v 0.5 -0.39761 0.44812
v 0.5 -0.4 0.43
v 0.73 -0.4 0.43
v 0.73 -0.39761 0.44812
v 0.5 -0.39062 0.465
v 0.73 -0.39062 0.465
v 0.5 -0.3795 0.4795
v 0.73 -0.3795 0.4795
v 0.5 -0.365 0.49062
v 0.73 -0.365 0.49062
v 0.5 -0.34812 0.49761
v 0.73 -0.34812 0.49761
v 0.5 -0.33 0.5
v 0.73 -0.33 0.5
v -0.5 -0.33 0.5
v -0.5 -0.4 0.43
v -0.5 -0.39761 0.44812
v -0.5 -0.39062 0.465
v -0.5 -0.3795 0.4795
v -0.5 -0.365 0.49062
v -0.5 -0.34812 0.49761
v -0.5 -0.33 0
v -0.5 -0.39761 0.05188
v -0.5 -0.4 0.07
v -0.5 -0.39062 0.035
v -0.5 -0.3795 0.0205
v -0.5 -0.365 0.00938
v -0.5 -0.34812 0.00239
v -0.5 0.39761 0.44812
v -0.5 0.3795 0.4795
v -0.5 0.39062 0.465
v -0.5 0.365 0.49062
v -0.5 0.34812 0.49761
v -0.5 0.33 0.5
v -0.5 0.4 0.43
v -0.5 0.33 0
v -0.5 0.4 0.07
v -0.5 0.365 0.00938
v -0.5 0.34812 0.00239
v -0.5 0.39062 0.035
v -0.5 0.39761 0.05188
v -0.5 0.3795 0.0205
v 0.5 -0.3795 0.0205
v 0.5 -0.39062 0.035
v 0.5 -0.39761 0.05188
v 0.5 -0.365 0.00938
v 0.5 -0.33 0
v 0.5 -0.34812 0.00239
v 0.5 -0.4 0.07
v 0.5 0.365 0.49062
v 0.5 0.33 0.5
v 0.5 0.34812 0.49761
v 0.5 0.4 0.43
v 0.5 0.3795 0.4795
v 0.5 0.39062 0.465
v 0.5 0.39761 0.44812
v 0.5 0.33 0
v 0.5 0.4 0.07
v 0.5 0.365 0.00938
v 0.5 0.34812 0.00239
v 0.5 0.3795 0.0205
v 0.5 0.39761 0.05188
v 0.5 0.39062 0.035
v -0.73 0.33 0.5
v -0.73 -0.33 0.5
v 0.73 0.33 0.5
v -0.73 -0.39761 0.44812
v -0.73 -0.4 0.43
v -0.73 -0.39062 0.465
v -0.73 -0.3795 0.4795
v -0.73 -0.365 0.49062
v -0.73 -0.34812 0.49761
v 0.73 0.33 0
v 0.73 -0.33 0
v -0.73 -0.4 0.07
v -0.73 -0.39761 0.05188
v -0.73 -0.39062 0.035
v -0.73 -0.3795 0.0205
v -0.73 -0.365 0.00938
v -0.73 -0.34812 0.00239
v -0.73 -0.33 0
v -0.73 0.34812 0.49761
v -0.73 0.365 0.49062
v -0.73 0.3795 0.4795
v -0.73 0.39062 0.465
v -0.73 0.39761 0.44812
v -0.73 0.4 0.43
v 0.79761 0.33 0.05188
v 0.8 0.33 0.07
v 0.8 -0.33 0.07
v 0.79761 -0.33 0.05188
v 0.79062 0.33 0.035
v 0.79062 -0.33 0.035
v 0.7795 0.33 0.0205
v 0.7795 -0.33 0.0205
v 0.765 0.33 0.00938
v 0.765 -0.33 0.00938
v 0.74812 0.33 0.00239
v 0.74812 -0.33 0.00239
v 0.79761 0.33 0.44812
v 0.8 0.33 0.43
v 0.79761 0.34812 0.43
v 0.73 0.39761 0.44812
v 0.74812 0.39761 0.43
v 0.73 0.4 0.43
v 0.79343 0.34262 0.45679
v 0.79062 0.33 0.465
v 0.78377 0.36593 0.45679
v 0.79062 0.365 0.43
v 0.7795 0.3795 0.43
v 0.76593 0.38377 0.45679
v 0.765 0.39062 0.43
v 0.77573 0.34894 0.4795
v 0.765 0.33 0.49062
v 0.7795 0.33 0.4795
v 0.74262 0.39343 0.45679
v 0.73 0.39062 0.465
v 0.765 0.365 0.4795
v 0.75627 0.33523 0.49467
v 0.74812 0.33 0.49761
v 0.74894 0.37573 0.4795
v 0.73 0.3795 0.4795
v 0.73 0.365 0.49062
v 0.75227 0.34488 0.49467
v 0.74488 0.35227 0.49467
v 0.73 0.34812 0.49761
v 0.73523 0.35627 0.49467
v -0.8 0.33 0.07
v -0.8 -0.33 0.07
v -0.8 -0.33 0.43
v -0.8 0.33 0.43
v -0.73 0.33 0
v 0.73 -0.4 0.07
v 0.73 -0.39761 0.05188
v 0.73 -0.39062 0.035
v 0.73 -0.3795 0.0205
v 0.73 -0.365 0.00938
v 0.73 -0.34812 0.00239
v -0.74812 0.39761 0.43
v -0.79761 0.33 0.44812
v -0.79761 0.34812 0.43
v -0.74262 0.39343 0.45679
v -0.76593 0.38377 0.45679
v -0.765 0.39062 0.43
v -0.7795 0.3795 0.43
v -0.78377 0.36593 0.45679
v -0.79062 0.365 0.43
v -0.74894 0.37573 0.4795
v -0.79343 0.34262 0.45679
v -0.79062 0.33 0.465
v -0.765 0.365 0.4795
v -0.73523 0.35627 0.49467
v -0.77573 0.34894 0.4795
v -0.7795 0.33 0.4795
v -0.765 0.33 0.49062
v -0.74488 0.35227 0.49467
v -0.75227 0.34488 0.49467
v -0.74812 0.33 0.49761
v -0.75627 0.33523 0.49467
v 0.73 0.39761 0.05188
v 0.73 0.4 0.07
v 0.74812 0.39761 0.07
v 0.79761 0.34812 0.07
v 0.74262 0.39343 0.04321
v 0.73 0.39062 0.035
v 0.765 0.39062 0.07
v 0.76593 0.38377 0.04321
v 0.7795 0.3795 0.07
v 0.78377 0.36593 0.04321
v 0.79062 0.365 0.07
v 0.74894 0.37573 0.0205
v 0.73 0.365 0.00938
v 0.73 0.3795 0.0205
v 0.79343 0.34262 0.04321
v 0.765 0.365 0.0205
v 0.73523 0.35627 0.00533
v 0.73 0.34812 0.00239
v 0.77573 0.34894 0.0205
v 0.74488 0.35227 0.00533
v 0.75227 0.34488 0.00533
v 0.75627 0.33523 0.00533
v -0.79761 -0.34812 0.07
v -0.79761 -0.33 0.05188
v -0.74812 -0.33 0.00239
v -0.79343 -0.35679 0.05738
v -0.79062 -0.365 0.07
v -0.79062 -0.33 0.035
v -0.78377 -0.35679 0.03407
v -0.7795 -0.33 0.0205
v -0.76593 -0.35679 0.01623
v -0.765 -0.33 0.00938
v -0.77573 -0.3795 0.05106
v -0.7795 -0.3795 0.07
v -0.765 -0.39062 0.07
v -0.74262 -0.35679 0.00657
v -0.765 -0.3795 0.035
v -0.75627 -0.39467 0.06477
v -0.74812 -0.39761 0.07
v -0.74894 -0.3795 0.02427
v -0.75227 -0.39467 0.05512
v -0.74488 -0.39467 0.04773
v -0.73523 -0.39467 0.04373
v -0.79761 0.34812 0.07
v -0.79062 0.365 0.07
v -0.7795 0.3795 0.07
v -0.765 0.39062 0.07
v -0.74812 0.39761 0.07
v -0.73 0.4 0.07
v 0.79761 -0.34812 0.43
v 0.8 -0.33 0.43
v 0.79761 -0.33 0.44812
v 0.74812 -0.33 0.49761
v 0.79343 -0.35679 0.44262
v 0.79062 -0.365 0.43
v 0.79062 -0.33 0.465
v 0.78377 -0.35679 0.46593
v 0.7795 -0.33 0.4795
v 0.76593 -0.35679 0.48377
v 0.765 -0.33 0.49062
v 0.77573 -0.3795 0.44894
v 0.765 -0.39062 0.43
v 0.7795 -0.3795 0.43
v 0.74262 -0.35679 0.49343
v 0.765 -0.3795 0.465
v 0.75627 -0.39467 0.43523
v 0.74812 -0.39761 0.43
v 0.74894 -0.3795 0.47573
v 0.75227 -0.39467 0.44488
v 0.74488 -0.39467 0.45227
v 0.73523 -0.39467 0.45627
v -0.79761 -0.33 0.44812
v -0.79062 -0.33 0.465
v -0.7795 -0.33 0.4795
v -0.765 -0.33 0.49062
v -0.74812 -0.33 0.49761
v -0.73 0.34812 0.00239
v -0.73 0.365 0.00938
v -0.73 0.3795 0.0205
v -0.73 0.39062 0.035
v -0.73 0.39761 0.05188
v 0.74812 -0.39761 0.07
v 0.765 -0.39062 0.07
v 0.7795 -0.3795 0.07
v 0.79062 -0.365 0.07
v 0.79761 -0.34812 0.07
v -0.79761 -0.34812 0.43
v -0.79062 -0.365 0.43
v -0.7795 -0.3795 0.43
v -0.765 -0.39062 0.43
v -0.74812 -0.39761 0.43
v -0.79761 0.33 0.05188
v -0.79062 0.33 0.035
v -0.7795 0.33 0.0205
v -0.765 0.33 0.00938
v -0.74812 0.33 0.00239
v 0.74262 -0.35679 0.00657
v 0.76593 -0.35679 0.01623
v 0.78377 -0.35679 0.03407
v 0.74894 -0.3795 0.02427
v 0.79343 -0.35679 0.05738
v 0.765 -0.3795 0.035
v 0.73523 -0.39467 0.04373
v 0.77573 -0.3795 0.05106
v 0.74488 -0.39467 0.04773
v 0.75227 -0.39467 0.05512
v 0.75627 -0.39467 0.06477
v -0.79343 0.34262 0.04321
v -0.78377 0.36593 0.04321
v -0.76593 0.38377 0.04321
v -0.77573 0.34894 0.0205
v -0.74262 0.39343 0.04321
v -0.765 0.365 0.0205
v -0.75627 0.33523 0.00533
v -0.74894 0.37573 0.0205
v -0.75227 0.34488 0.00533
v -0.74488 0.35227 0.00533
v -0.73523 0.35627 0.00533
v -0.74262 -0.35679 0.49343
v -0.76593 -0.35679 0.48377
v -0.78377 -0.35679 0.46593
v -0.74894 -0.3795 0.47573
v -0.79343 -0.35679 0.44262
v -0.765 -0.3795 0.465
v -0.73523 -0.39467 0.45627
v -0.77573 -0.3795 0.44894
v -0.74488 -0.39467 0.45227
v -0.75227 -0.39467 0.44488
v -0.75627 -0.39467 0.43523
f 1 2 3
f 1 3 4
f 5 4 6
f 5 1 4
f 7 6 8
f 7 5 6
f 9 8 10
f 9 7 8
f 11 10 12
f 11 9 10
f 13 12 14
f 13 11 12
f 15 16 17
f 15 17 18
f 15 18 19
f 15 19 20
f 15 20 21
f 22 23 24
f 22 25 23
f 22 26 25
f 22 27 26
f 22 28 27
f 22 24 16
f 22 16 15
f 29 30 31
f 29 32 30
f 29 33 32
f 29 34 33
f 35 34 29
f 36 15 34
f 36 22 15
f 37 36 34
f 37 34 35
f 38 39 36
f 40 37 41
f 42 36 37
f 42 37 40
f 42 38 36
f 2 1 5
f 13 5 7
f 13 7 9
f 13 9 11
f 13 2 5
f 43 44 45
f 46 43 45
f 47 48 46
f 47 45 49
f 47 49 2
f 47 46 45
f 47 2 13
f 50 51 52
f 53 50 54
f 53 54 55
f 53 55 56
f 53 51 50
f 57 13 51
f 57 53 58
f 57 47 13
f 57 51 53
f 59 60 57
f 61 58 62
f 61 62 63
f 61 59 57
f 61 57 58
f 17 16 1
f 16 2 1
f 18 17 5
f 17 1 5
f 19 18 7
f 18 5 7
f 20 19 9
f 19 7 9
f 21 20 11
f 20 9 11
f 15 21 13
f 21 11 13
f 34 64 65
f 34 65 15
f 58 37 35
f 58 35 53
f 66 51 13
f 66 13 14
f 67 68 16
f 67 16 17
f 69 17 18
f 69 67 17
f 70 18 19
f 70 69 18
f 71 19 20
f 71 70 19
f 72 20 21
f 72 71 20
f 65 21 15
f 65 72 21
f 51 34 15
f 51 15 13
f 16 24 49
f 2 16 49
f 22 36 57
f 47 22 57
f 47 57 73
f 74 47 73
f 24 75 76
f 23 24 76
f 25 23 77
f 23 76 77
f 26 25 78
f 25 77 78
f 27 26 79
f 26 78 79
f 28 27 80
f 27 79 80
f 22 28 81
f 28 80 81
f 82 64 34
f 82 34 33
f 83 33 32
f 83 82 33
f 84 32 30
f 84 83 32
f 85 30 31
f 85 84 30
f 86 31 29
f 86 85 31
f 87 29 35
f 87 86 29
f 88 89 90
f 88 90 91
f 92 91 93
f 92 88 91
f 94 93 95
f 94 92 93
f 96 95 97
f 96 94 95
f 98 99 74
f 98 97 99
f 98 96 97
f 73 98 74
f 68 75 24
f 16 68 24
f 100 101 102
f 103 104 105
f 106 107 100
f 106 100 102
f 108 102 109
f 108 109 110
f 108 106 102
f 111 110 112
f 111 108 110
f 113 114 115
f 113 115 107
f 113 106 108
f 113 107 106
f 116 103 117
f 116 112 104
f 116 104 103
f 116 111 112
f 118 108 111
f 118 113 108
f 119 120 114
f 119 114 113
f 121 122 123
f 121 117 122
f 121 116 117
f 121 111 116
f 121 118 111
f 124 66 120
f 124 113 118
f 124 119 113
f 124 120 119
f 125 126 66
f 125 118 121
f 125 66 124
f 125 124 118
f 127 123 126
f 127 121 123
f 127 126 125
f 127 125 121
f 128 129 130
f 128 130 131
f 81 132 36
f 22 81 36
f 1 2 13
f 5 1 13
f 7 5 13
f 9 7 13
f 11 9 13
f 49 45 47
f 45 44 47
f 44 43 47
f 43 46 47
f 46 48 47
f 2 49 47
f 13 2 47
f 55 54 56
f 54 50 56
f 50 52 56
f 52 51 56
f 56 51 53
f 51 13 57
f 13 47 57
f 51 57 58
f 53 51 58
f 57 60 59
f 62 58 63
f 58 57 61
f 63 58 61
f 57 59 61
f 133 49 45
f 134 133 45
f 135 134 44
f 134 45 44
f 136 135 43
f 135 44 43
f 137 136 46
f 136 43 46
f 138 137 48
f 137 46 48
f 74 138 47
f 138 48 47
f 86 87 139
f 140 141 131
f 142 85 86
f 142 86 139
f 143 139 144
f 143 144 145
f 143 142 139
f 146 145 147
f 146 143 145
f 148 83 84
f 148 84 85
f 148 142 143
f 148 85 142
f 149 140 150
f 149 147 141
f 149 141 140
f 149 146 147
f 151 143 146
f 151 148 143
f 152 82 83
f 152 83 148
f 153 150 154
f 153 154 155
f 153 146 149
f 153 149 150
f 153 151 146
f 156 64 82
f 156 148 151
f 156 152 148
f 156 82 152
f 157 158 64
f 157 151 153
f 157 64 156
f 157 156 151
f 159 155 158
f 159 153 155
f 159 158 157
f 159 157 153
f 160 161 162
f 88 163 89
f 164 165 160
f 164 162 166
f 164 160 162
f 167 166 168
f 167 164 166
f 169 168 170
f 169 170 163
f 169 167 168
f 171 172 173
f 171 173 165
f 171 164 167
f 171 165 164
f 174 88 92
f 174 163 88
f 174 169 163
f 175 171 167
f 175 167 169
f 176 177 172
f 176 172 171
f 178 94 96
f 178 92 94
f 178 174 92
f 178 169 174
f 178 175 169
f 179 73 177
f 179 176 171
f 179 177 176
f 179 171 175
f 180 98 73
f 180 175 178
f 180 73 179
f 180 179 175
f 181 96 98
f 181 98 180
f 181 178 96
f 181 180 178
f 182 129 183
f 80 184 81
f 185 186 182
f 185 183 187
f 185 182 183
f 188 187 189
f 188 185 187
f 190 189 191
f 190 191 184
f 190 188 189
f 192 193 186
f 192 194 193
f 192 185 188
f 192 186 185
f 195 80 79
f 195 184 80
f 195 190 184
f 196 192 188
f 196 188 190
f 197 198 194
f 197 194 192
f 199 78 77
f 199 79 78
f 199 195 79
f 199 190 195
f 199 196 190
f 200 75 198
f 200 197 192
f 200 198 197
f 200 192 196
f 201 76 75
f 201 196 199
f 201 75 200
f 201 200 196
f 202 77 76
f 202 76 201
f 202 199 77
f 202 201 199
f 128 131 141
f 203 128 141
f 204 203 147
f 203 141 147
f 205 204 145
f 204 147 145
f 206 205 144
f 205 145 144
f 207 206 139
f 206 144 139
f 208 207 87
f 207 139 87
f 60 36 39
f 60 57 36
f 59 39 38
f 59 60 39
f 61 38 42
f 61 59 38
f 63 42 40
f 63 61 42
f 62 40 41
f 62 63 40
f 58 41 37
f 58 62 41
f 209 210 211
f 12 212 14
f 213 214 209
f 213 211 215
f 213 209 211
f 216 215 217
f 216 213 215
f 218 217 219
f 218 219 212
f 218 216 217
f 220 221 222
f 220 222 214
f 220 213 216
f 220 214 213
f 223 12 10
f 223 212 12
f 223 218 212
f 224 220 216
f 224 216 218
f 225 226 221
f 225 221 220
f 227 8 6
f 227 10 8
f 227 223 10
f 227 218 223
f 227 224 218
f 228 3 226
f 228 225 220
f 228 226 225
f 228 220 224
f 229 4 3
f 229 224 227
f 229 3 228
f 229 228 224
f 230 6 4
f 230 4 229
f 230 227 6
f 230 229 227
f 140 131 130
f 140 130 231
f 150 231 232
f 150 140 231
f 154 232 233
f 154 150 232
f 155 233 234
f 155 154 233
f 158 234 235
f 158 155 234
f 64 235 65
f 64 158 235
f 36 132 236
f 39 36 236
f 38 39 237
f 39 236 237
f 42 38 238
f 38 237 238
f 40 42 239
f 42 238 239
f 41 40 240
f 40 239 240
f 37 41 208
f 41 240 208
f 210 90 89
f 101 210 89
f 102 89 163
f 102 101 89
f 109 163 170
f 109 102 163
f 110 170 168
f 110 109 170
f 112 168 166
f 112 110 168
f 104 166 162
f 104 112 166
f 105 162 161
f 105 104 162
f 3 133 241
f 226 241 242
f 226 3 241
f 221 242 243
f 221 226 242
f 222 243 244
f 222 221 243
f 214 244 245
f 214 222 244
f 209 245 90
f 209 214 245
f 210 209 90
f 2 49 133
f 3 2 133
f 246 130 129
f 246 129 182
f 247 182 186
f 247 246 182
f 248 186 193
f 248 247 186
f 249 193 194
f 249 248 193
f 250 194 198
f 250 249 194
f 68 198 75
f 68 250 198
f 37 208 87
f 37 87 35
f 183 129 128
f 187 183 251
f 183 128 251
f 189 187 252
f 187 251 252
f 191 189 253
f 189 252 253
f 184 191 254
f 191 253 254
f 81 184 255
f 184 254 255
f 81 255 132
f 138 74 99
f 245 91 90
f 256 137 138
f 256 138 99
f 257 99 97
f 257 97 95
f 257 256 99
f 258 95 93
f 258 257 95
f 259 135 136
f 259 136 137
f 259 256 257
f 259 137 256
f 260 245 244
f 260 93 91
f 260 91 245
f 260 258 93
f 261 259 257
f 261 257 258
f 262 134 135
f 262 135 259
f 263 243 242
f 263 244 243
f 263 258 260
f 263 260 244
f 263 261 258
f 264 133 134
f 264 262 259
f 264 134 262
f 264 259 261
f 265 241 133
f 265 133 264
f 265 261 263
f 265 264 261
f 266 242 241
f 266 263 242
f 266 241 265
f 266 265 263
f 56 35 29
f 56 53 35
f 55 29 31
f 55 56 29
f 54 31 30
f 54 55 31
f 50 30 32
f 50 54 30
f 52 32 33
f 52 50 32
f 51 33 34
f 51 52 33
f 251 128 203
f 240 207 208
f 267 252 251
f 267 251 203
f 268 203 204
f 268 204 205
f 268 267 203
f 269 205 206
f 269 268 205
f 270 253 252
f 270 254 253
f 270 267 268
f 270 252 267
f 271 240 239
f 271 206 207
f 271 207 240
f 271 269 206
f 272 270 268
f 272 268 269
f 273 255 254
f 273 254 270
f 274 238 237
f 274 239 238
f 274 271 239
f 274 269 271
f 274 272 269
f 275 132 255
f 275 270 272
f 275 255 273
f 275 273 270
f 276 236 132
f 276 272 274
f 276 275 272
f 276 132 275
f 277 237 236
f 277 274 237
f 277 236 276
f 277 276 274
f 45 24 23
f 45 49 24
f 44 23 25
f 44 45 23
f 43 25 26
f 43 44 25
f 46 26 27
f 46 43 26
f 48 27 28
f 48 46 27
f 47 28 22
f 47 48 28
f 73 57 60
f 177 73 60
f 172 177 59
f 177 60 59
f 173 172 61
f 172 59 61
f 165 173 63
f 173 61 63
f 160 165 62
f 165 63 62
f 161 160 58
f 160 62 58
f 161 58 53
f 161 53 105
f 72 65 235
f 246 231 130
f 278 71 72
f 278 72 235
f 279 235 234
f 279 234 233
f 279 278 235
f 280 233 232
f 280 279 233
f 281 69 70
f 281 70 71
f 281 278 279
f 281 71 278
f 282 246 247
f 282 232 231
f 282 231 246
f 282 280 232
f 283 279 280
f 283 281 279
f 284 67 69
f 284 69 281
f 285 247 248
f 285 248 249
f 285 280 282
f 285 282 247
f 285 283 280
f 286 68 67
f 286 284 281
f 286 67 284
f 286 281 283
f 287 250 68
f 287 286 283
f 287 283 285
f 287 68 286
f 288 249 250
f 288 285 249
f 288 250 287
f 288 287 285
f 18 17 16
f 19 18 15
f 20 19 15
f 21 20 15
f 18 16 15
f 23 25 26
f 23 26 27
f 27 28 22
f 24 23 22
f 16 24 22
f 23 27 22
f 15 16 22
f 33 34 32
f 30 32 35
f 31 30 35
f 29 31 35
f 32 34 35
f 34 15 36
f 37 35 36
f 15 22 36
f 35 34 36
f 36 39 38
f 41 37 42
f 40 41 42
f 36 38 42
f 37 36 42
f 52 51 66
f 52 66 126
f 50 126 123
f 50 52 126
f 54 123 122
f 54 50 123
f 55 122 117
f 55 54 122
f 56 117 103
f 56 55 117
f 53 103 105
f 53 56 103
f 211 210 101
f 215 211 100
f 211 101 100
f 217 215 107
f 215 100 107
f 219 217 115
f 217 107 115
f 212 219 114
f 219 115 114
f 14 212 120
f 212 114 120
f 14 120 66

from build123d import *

# Parameters (mm, degrees)
F0_W           = 0.3
F0_H           = 0.8
F1_DEPTH       = 0.5
F0_W_2         = 1
F2_DEPTH       = 0.5
F3_R           = 0.07
F3_2_R         = 0.07
F4_T1_DEPTH    = 0.405
F4_S5_W        = 0.07
F4_S5_H        = 0.07
F4_T6_DEPTH    = 0.07
F4_S11_W       = 0.07
F4_S11_H       = 0.07
F4_T12_DEPTH   = 0.07
F4_S17_W       = 0.07
F4_S17_H       = 0.07
F4_T18_DEPTH   = 0.07
F4_S23_W       = 0.07
F4_S23_H       = 0.07
F4_T24_DEPTH   = 0.07
F4_2_F1_R      = 0.07
F4_2_F2_R      = 0.07
F4_2_F3_R      = 0.07
F4_2_F4_R      = 0.07
F4_3_T1_DEPTH  = 0.405
F4_3_S5_W      = 0.07
F4_3_S5_H      = 0.07
F4_3_T6_DEPTH  = 0.07
F4_3_S11_W     = 0.07
F4_3_S11_H     = 0.07
F4_3_T12_DEPTH = 0.07
F4_3_S17_W     = 0.07
F4_3_S17_H     = 0.07
F4_3_T18_DEPTH = 0.07
F4_3_S23_W     = 0.07
F4_3_S23_H     = 0.07
F4_3_T24_DEPTH = 0.07


# Not quite as in the source:
# - a fillet or chamfer that OpenCascade refuses, or shapes differently, is made with other operations: its cross-section is extruded or revolved along the edge and cut away or added


with BuildPart() as f1:
    # F0 (on Top) → F1 (new body)
    with BuildSketch(Plane.XY):
        with Locations((-0.65, 0)):
            Rectangle(F0_W, F0_H)
    extrude(amount=F1_DEPTH)

    # F3#2
    f3_2_edges = [f1.edges().sort_by_distance(p)[0] for p in [
        (-0.8, 0.4, 0.25),
        (-0.8, -0.4, 0.25),
        (-0.8, 0, 0),
        (-0.8, 0, 0.5),
    ]]
    fillet(f3_2_edges, radius=F3_2_R)

    # F4#3: fillet of radius 0.07 on 4 edges, made by hand

    # F4_3_s2 → F4_3_t1 (cut)
    with BuildSketch(Plane.YZ.offset(-0.73)):
        with BuildLine():
            ThreePointArc((0.33, 0.5), (0.3794974747, 0.4794974747), (0.4, 0.43))
            Line((0.4, 0.43), (0.4, 0.5))
            Line((0.4, 0.5), (0.33, 0.5))
        make_face()
        with BuildLine():
            ThreePointArc((0.33, 0), (0.3794974747, 0.0205025253), (0.4, 0.07))
            Line((0.4, 0.07), (0.4, 0))
            Line((0.4, 0), (0.33, 0))
        make_face()
        with BuildLine():
            ThreePointArc((-0.4, 0.43), (-0.3794974747, 0.4794974747), (-0.33, 0.5))
            Line((-0.33, 0.5), (-0.4, 0.5))
            Line((-0.4, 0.5), (-0.4, 0.43))
        make_face()
        with BuildLine():
            ThreePointArc((-0.4, 0.07), (-0.3794974747, 0.0205025253), (-0.33, 0))
            Line((-0.33, 0), (-0.4, 0))
            Line((-0.4, 0), (-0.4, 0.07))
        make_face()
    extrude(amount=F4_3_T1_DEPTH, mode=Mode.SUBTRACT)


with BuildPart() as f1b:
    # F0 (on Top) → F1, piece 2 (new body)
    with BuildSketch(Plane.XY):
        with Locations((0.65, 0)):
            Rectangle(F0_W, F0_H)
    extrude(amount=F1_DEPTH)

    # F3
    f3_edges = [f1b.edges().sort_by_distance(p)[0] for p in [
        (0.8, -0.4, 0.25),
        (0.8, 0.4, 0.25),
        (0.8, 0, 0),
        (0.8, 0, 0.5),
    ]]
    fillet(f3_edges, radius=F3_R)

    # F4: fillet of radius 0.07 on 4 edges, made by hand

    # F4_s2 → F4_t1 (cut)
    with BuildSketch(Plane.YZ.offset(0.325)):
        with BuildLine():
            ThreePointArc((0.33, 0.5), (0.3794974747, 0.4794974747), (0.4, 0.43))
            Line((0.4, 0.43), (0.4, 0.5))
            Line((0.4, 0.5), (0.33, 0.5))
        make_face()
        with BuildLine():
            ThreePointArc((0.33, 0), (0.3794974747, 0.0205025253), (0.4, 0.07))
            Line((0.4, 0.07), (0.4, 0))
            Line((0.4, 0), (0.33, 0))
        make_face()
        with BuildLine():
            ThreePointArc((-0.4, 0.43), (-0.3794974747, 0.4794974747), (-0.33, 0.5))
            Line((-0.33, 0.5), (-0.4, 0.5))
            Line((-0.4, 0.5), (-0.4, 0.43))
        make_face()
        with BuildLine():
            ThreePointArc((-0.4, 0.07), (-0.3794974747, 0.0205025253), (-0.33, 0))
            Line((-0.33, 0), (-0.4, 0))
            Line((-0.4, 0), (-0.4, 0.07))
        make_face()
    extrude(amount=F4_T1_DEPTH, mode=Mode.SUBTRACT)


with BuildPart() as f2:
    # F0 (on Top) → F2 (new body)
    with BuildSketch(Plane.XY):
        Rectangle(F0_W_2, F0_H)
    extrude(amount=F2_DEPTH)

    # F4#2: fillet of radius 0.07 on 4 edges, made by hand

    # F4_2_f1
    f4_2_f1_edges = [f2.edges().sort_by_distance(p)[0] for p in [
        (0, -0.4, 0),
    ]]
    fillet(f4_2_f1_edges, radius=F4_2_F1_R)

    # F4_2_f2
    f4_2_f2_edges = [f2.edges().sort_by_distance(p)[0] for p in [
        (0, -0.4, 0.5),
    ]]
    fillet(f4_2_f2_edges, radius=F4_2_F2_R)

    # F4_2_f3
    f4_2_f3_edges = [f2.edges().sort_by_distance(p)[0] for p in [
        (0, 0.4, 0),
    ]]
    fillet(f4_2_f3_edges, radius=F4_2_F3_R)

    # F4_2_f4
    f4_2_f4_edges = [f2.edges().sort_by_distance(p)[0] for p in [
        (0, 0.4, 0.5),
    ]]
    fillet(f4_2_f4_edges, radius=F4_2_F4_R)


with BuildPart() as f4_tool4:
    # F4_s5 → F4_t6 (new body)
    with BuildSketch(Plane.XZ.offset(0.33)):
        with Locations((0.765, 0.035)):
            Rectangle(F4_S5_W, F4_S5_H)
    extrude(amount=F4_T6_DEPTH)

    # F4_s7 → F4_t8 (revolve, cut)
    with BuildSketch(Plane(origin=(0.73, -0.33, 0.07), x_dir=(-0.7071067812, 0, 0.7071067812), z_dir=(0.7071067812, 0, 0.7071067812))):
        with BuildLine():
            ThreePointArc((0, -0.07), (0.07, 0), (0, 0.07))
            Line((0, 0.07), (0, -0.07))
        make_face()
    revolve(axis=Axis((0.73, -0.33, 0.07), (0, -1, 0)), mode=Mode.SUBTRACT)


with BuildPart() as f1b_1:
    add(f1b.part)

    # F4_t3: cut F4_tool4
    add(f4_tool4.part, mode=Mode.SUBTRACT)


with BuildPart() as f4_tool10:
    # F4_s11 → F4_t12 (new body)
    with BuildSketch(Plane.XZ.offset(0.33)):
        with Locations((0.765, 0.465)):
            Rectangle(F4_S11_W, F4_S11_H)
    extrude(amount=F4_T12_DEPTH)

    # F4_s13 → F4_t14 (revolve, cut)
    with BuildSketch(Plane(origin=(0.73, -0.33, 0.43), x_dir=(-0.7071067812, 0, -0.7071067812), z_dir=(-0.7071067812, 0, 0.7071067812))):
        with BuildLine():
            ThreePointArc((0, -0.07), (0.07, 0), (0, 0.07))
            Line((0, 0.07), (0, -0.07))
        make_face()
    revolve(axis=Axis((0.73, -0.33, 0.43), (0, -1, 0)), mode=Mode.SUBTRACT)


with BuildPart() as f1b_2:
    add(f1b_1.part)

    # F4_t9: cut F4_tool10
    add(f4_tool10.part, mode=Mode.SUBTRACT)


with BuildPart() as f4_tool16:
    # F4_s17 → F4_t18 (new body)
    with BuildSketch(Plane.XY.offset(0.07)):
        with Locations((0.765, 0.365)):
            Rectangle(F4_S17_W, F4_S17_H)
    extrude(amount=-F4_T18_DEPTH)

    # F4_s19 → F4_t20 (revolve, cut)
    with BuildSketch(Plane(origin=(0.73, 0.33, 0.07), x_dir=(-0.7071067812, -0.7071067812, 0), z_dir=(0.7071067812, -0.7071067812, 0))):
        with BuildLine():
            ThreePointArc((0, -0.07), (0.07, 0), (0, 0.07))
            Line((0, 0.07), (0, -0.07))
        make_face()
    revolve(axis=Axis((0.73, 0.33, 0.07), (0, 0, -1)), mode=Mode.SUBTRACT)


with BuildPart() as f1b_3:
    add(f1b_2.part)

    # F4_t15: cut F4_tool16
    add(f4_tool16.part, mode=Mode.SUBTRACT)


with BuildPart() as f4_tool22:
    # F4_s23 → F4_t24 (new body)
    with BuildSketch(Plane.XY.offset(0.43)):
        with Locations((0.765, 0.365)):
            Rectangle(F4_S23_W, F4_S23_H)
    extrude(amount=F4_T24_DEPTH)

    # F4_s25 → F4_t26 (revolve, cut)
    with BuildSketch(Plane(origin=(0.73, 0.33, 0.43), x_dir=(-0.7071067812, -0.7071067812, 0), z_dir=(-0.7071067812, 0.7071067812, 0))):
        with BuildLine():
            ThreePointArc((0, -0.07), (0.07, 0), (0, 0.07))
            Line((0, 0.07), (0, -0.07))
        make_face()
    revolve(axis=Axis((0.73, 0.33, 0.43), (0, 0, 1)), mode=Mode.SUBTRACT)


with BuildPart() as f1b_4:
    add(f1b_3.part)

    # F4_t21: cut F4_tool22
    add(f4_tool22.part, mode=Mode.SUBTRACT)


with BuildPart() as f4_3_tool4:
    # F4_3_s5 → F4_3_t6 (new body)
    with BuildSketch(Plane.XZ.offset(0.33)):
        with Locations((-0.765, 0.035)):
            Rectangle(F4_3_S5_W, F4_3_S5_H)
    extrude(amount=F4_3_T6_DEPTH)

    # F4_3_s7 → F4_3_t8 (revolve, cut)
    with BuildSketch(Plane(origin=(-0.73, -0.33, 0.07), x_dir=(0.7071067812, 0, 0.7071067812), z_dir=(0.7071067812, 0, -0.7071067812))):
        with BuildLine():
            ThreePointArc((0, -0.07), (0.07, 0), (0, 0.07))
            Line((0, 0.07), (0, -0.07))
        make_face()
    revolve(axis=Axis((-0.73, -0.33, 0.07), (0, -1, 0)), mode=Mode.SUBTRACT)


with BuildPart() as f1_1:
    add(f1.part)

    # F4_3_t3: cut F4_3_tool4
    add(f4_3_tool4.part, mode=Mode.SUBTRACT)


with BuildPart() as f4_3_tool10:
    # F4_3_s11 → F4_3_t12 (new body)
    with BuildSketch(Plane.XZ.offset(0.33)):
        with Locations((-0.765, 0.465)):
            Rectangle(F4_3_S11_W, F4_3_S11_H)
    extrude(amount=F4_3_T12_DEPTH)

    # F4_3_s13 → F4_3_t14 (revolve, cut)
    with BuildSketch(Plane(origin=(-0.73, -0.33, 0.43), x_dir=(0.7071067812, 0, -0.7071067812), z_dir=(-0.7071067812, 0, -0.7071067812))):
        with BuildLine():
            ThreePointArc((0, -0.07), (0.07, 0), (0, 0.07))
            Line((0, 0.07), (0, -0.07))
        make_face()
    revolve(axis=Axis((-0.73, -0.33, 0.43), (0, -1, 0)), mode=Mode.SUBTRACT)


with BuildPart() as f1_2:
    add(f1_1.part)

    # F4_3_t9: cut F4_3_tool10
    add(f4_3_tool10.part, mode=Mode.SUBTRACT)


with BuildPart() as f4_3_tool16:
    # F4_3_s17 → F4_3_t18 (new body)
    with BuildSketch(Plane.XY.offset(0.07)):
        with Locations((-0.765, 0.365)):
            Rectangle(F4_3_S17_W, F4_3_S17_H)
    extrude(amount=-F4_3_T18_DEPTH)

    # F4_3_s19 → F4_3_t20 (revolve, cut)
    with BuildSketch(Plane(origin=(-0.73, 0.33, 0.07), x_dir=(0.7071067812, -0.7071067812, 0), z_dir=(0.7071067812, 0.7071067812, 0))):
        with BuildLine():
            ThreePointArc((0, -0.07), (0.07, 0), (0, 0.07))
            Line((0, 0.07), (0, -0.07))
        make_face()
    revolve(axis=Axis((-0.73, 0.33, 0.07), (0, 0, -1)), mode=Mode.SUBTRACT)


with BuildPart() as f1_3:
    add(f1_2.part)

    # F4_3_t15: cut F4_3_tool16
    add(f4_3_tool16.part, mode=Mode.SUBTRACT)


with BuildPart() as f4_3_tool22:
    # F4_3_s23 → F4_3_t24 (new body)
    with BuildSketch(Plane.XY.offset(0.43)):
        with Locations((-0.765, 0.365)):
            Rectangle(F4_3_S23_W, F4_3_S23_H)
    extrude(amount=F4_3_T24_DEPTH)

    # F4_3_s25 → F4_3_t26 (revolve, cut)
    with BuildSketch(Plane(origin=(-0.73, 0.33, 0.43), x_dir=(0.7071067812, -0.7071067812, 0), z_dir=(-0.7071067812, -0.7071067812, 0))):
        with BuildLine():
            ThreePointArc((0, -0.07), (0.07, 0), (0, 0.07))
            Line((0, 0.07), (0, -0.07))
        make_face()
    revolve(axis=Axis((-0.73, 0.33, 0.43), (0, 0, 1)), mode=Mode.SUBTRACT)


with BuildPart() as f1_4:
    add(f1_3.part)

    # F4_3_t21: cut F4_3_tool22
    add(f4_3_tool22.part, mode=Mode.SUBTRACT)


solid = Compound([f2.part, f1b_4.part, f1_4.part])
